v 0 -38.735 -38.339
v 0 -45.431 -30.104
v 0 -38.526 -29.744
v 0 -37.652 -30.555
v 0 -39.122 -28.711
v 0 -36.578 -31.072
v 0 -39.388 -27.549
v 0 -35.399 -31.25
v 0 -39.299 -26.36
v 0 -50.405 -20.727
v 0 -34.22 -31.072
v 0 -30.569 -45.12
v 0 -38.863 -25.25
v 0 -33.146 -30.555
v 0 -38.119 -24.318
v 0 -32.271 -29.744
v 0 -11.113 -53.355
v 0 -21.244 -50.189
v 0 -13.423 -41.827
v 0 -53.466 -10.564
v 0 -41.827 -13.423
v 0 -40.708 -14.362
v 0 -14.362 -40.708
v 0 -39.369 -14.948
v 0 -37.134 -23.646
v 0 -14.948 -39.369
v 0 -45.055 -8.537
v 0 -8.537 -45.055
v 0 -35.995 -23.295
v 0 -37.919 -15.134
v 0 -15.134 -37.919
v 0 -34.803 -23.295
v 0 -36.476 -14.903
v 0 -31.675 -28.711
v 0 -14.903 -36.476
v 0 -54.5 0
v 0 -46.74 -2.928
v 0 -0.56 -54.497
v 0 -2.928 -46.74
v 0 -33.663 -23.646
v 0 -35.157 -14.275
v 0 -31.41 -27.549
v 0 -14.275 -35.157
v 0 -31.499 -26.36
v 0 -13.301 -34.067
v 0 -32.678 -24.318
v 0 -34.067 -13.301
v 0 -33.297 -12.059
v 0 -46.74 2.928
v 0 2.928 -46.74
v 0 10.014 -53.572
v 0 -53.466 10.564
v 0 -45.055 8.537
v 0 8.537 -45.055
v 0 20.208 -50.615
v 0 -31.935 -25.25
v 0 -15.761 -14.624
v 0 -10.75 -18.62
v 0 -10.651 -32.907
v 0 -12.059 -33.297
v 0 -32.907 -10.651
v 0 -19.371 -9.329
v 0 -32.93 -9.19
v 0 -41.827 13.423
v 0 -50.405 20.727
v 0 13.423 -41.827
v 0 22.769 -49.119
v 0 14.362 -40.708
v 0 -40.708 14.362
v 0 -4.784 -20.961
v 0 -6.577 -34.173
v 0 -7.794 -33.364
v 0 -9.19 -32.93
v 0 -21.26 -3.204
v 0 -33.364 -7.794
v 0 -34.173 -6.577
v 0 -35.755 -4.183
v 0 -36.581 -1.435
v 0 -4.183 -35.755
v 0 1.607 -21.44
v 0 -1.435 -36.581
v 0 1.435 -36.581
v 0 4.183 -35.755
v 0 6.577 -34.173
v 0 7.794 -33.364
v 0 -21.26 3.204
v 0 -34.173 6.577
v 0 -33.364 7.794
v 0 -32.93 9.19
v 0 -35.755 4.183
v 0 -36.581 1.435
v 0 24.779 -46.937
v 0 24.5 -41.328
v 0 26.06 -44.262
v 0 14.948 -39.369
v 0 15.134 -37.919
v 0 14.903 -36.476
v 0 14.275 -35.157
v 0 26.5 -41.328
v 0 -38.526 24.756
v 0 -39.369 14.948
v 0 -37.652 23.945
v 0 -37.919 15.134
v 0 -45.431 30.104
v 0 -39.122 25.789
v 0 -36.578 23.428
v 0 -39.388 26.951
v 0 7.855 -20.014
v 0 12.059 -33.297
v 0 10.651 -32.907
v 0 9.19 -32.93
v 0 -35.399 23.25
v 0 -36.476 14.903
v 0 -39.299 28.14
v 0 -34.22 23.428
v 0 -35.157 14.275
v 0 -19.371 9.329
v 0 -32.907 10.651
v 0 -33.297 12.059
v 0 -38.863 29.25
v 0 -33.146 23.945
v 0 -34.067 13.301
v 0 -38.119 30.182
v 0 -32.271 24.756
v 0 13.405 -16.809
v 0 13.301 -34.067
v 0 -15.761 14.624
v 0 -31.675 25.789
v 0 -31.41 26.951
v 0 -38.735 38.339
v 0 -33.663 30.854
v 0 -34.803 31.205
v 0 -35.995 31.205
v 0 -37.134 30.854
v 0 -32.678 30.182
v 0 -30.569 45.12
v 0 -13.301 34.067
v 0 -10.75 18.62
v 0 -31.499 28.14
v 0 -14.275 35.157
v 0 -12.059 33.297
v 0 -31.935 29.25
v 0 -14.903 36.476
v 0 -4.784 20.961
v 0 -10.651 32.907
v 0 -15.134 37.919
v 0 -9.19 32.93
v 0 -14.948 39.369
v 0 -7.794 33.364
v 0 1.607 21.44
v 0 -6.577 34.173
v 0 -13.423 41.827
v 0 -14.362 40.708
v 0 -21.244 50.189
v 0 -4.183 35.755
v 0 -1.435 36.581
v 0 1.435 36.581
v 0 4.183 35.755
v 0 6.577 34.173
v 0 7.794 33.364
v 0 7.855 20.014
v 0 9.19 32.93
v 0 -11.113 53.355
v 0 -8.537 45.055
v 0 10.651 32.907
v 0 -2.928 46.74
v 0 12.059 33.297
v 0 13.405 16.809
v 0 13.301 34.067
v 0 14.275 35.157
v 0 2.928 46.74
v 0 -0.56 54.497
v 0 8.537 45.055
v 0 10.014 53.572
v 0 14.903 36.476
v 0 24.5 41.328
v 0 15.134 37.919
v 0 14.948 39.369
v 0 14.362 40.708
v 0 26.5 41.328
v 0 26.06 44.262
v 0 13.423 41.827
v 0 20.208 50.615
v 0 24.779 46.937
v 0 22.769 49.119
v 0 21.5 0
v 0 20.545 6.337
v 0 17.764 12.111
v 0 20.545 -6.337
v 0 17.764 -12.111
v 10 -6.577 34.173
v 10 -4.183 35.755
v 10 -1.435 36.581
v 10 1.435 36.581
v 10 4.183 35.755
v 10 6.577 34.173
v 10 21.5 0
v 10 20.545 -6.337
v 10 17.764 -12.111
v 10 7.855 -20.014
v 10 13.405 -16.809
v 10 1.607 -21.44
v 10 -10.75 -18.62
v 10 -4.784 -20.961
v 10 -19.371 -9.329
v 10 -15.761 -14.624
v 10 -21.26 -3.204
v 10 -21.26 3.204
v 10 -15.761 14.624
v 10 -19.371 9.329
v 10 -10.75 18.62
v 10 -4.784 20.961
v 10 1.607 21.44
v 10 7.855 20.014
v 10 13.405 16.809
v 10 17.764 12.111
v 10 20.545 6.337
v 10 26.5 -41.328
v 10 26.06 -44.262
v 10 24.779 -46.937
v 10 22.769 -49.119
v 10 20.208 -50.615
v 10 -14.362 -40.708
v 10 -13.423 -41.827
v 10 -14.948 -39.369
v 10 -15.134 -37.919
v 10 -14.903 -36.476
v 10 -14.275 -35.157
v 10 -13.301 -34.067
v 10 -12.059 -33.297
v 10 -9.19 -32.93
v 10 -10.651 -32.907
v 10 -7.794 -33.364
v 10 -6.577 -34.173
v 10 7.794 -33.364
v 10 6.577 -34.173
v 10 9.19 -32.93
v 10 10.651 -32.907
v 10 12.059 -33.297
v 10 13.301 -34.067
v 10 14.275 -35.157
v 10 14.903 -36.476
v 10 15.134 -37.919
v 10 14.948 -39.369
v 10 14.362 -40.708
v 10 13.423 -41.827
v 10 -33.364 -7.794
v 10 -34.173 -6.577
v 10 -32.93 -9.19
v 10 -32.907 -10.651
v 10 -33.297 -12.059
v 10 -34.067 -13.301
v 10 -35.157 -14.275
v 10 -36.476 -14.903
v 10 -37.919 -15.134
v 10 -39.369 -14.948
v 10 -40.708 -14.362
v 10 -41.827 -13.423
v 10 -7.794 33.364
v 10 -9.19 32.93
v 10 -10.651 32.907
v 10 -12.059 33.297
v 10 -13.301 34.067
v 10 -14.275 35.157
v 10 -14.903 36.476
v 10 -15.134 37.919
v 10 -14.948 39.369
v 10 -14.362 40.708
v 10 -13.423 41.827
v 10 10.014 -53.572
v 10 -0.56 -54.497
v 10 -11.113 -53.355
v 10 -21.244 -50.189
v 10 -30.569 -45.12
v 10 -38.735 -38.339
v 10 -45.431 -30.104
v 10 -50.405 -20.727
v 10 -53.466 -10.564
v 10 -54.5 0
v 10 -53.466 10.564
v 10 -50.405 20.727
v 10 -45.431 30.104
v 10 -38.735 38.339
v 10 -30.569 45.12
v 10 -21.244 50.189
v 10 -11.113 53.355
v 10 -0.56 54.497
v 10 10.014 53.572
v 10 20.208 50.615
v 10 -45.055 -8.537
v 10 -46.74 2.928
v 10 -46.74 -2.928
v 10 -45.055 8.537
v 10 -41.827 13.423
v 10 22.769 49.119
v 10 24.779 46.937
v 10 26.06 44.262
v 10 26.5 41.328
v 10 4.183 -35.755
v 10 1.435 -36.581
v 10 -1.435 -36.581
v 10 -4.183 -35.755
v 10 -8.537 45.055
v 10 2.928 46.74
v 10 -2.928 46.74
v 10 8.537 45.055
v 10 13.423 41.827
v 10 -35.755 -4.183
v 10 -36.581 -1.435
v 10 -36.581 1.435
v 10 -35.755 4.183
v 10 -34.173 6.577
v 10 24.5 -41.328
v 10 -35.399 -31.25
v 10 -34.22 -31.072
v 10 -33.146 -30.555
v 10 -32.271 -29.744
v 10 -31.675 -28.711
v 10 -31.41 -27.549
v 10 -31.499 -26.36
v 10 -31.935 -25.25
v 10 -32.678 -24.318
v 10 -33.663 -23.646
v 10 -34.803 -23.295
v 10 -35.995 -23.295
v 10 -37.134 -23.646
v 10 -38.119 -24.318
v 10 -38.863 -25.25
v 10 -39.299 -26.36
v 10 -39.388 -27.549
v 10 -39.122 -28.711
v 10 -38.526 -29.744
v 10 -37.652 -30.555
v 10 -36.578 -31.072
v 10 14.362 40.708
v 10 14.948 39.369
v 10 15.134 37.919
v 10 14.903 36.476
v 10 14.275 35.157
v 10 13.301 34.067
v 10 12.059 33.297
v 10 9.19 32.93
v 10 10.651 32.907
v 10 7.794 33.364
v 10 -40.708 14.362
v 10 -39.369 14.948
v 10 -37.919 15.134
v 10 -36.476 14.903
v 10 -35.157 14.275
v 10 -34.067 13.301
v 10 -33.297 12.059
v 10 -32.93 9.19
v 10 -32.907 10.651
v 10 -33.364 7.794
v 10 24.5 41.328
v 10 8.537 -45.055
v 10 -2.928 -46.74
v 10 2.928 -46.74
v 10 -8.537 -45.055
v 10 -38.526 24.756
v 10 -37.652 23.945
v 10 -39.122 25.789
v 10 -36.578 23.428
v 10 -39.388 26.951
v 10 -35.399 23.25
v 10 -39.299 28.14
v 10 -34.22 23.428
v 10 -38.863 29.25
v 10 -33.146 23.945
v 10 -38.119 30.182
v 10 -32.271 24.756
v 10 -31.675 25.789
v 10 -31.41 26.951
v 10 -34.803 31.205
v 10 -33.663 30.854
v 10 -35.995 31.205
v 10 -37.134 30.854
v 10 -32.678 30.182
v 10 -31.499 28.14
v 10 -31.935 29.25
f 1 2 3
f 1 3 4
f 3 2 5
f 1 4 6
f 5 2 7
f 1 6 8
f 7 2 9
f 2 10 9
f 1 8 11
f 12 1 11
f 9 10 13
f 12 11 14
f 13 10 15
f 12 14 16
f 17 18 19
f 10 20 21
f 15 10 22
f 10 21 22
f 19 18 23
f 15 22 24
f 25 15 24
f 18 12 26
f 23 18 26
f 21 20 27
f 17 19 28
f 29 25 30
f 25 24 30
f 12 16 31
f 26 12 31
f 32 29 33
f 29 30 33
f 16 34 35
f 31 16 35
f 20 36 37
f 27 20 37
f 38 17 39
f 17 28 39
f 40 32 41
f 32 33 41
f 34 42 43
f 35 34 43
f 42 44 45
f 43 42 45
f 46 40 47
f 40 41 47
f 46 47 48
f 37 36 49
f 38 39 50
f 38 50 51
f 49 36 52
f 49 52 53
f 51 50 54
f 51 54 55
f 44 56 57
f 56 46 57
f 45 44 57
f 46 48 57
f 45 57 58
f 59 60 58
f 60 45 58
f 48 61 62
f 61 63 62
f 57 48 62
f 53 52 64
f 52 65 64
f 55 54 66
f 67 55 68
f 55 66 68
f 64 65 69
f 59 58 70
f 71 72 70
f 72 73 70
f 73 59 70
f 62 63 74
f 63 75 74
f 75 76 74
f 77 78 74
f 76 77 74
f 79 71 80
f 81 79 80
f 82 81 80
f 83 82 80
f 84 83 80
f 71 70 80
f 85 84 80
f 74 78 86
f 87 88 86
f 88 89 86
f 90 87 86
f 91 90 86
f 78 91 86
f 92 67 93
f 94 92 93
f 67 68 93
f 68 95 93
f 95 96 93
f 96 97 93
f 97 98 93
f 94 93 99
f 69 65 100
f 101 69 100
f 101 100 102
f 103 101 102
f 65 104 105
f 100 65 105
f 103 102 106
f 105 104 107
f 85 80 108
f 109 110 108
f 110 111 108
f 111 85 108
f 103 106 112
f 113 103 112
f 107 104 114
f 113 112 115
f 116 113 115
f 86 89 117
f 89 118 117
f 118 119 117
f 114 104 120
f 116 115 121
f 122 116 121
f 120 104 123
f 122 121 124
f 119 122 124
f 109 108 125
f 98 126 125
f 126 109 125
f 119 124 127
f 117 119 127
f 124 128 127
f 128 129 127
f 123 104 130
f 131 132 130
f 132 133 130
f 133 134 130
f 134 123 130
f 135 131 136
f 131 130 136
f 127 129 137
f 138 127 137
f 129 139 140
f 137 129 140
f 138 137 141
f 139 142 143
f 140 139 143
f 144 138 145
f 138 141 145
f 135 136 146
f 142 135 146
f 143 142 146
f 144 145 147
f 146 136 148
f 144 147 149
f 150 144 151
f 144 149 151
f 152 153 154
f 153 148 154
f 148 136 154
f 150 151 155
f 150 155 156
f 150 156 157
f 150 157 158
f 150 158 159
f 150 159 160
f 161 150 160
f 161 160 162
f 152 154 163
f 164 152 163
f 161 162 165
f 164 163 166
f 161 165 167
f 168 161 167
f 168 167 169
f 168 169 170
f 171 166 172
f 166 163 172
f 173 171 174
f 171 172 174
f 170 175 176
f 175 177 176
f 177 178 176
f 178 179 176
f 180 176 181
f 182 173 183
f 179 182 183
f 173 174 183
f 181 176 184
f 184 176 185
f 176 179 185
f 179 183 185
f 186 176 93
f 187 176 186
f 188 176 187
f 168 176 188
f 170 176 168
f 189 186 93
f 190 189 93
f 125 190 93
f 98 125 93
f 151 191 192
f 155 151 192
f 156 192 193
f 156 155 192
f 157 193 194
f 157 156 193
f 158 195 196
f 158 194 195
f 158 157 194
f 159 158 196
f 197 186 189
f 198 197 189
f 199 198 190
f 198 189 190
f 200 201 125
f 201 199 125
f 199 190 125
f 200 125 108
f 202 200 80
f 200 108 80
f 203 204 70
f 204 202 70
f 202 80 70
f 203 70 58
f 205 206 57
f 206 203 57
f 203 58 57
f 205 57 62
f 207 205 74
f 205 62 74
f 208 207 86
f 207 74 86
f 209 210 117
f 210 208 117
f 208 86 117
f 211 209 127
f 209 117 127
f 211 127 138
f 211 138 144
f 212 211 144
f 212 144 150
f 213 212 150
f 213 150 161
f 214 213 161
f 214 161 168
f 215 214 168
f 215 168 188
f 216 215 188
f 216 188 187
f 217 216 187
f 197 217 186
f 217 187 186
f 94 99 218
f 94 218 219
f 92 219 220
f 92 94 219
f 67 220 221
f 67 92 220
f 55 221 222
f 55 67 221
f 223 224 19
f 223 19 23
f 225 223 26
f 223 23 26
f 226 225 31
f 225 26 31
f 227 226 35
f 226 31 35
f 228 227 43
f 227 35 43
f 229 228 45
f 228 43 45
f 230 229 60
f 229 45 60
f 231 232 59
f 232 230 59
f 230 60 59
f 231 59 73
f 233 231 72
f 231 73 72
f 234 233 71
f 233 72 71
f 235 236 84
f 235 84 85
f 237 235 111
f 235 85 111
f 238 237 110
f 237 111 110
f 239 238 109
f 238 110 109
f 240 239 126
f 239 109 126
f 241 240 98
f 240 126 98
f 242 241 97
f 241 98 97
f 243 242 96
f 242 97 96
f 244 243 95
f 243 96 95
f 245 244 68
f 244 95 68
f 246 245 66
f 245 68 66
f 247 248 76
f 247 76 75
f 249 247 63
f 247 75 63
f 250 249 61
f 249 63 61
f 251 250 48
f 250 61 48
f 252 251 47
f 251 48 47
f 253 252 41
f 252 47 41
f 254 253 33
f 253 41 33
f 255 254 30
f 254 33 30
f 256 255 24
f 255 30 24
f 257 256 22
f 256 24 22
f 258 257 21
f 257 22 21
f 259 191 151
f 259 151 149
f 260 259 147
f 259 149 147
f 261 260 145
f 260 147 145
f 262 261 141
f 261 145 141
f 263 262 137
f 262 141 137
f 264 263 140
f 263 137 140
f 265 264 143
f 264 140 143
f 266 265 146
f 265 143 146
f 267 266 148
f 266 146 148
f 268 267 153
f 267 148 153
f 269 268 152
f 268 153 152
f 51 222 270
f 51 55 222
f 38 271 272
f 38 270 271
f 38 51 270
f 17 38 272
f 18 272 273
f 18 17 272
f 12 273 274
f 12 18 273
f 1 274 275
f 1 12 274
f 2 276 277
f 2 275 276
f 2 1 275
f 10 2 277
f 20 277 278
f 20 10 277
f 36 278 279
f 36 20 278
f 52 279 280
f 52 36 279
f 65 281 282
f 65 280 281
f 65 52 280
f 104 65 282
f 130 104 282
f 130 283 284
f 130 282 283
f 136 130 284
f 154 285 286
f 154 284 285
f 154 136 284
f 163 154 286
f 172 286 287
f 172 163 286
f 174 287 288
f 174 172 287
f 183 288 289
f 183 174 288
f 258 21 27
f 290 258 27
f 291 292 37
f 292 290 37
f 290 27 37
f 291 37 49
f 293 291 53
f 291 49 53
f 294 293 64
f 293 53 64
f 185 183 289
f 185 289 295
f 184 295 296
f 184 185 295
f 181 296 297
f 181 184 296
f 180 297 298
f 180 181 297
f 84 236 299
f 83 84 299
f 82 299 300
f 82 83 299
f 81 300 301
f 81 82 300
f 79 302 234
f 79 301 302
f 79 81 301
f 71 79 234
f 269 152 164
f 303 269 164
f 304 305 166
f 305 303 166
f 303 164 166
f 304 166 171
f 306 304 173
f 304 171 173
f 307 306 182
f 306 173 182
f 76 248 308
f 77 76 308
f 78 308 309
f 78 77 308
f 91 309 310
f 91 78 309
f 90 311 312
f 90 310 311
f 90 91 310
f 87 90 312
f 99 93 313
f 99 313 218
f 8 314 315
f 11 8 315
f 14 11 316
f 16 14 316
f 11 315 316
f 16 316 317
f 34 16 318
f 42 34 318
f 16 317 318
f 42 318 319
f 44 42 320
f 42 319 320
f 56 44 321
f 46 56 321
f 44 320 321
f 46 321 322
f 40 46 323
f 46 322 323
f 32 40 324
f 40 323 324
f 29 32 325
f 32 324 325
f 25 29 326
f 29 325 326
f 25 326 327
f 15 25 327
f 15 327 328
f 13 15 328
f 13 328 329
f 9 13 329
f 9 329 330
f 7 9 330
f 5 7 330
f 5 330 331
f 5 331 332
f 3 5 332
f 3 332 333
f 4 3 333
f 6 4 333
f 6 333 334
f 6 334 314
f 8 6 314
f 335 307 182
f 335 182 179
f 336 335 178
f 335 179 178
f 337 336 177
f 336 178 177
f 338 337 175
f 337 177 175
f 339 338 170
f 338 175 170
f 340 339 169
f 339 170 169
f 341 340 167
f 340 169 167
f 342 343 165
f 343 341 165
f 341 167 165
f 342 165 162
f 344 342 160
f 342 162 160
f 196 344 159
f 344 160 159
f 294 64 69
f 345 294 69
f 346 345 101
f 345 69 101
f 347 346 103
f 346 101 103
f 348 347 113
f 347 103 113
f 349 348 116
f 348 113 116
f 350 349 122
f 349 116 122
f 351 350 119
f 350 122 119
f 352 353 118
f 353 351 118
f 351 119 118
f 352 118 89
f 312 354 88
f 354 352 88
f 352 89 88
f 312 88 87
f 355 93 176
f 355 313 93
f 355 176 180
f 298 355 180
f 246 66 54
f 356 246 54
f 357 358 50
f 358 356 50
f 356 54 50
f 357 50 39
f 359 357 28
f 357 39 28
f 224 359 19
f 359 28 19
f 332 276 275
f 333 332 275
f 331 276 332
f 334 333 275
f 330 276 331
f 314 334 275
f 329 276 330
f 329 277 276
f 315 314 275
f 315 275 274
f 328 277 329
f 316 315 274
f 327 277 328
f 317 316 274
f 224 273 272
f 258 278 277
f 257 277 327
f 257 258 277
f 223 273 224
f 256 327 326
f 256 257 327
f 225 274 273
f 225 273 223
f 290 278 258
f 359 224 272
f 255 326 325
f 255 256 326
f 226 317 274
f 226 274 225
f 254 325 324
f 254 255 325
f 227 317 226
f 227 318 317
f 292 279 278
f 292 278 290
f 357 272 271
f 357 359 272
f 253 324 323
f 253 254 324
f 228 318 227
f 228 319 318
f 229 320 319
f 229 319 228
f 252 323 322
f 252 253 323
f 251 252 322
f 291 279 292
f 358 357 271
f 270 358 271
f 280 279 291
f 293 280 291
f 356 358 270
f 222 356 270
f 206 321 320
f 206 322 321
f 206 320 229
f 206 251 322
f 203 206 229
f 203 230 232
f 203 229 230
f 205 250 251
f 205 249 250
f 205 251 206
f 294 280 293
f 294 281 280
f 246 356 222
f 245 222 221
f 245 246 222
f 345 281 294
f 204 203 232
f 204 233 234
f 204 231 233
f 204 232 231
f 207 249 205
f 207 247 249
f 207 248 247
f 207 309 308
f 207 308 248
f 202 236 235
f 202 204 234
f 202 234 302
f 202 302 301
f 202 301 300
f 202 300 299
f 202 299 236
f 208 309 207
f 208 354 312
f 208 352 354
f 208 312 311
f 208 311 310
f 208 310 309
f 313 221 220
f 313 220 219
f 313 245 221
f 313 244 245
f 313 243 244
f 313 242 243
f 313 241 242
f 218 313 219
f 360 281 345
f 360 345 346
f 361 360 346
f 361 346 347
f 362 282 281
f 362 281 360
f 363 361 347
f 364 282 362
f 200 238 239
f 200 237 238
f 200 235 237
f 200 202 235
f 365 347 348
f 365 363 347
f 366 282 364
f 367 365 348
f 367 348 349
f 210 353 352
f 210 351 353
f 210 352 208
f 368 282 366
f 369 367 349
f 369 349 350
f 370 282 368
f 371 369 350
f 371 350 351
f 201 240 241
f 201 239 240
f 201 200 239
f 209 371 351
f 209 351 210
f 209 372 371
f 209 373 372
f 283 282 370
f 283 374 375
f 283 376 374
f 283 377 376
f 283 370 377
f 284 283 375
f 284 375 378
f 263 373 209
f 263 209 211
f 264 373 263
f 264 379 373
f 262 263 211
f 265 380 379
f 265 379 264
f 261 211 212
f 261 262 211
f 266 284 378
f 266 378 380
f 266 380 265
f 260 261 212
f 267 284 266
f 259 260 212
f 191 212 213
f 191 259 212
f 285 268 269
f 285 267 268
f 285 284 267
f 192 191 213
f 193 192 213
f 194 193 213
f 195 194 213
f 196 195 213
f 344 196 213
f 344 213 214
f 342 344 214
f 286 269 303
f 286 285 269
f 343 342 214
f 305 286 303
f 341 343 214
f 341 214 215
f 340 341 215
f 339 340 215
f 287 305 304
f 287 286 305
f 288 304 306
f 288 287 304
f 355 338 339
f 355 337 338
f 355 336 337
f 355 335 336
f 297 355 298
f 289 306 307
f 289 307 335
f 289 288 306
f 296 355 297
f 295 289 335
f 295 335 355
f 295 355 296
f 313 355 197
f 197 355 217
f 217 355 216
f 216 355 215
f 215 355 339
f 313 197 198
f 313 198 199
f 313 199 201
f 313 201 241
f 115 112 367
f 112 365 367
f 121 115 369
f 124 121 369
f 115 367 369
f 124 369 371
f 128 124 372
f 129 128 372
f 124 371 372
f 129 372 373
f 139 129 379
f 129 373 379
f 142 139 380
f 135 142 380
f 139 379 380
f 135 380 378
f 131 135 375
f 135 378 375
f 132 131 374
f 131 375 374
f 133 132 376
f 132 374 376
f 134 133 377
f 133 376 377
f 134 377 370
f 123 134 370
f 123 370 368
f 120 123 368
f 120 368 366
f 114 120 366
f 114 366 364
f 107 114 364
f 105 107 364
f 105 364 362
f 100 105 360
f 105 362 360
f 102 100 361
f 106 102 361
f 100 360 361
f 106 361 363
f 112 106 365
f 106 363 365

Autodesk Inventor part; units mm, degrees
ref_plane "YZ Plane" through (0, 0, 0) normal (1, 0, 0) x (0, 1, 0)
ref_plane "XZ Plane" through (0, 0, 0) normal (0, 1, 0) x (-1, 0, 0)
ref_plane "XY Plane" through (0, 0, 0) normal (0, 0, 1) x (1, 0, 0)
sketch "Sketch1" plane through (0, 0, 0) normal (1, 0, 0) x (0, 1, 0)
  arc A0 (13.4228, -41.8269) -> (6.5772, -34.1731) centre (10, -38) ccw
  arc A1 (-13.4228, -41.8269) -> (13.4228, -41.8269) centre (0, -26.8197) ccw
  arc A2 (-6.5772, -34.1731) -> (-13.4228, -41.8269) centre (-10, -38) ccw
  arc A3 (-6.5772, -34.1731) -> (6.5772, -34.1731) centre (0, -26.8197) ccw
  arc A4 (-41.8269, -13.4228) -> (-34.1731, -6.5772) centre (-38, -10) ccw
  arc A5 (-41.8269, 13.4228) -> (-41.8269, -13.4228) centre (-26.8197, 0) ccw
  arc A6 (-34.1731, 6.5772) -> (-41.8269, 13.4228) centre (-38, 10) ccw
  arc A7 (-34.1731, 6.5772) -> (-34.1731, -6.5772) centre (-26.8197, 0) ccw
  arc A8 (-13.4228, 41.8269) -> (-6.5772, 34.1731) centre (-10, 38) ccw
  arc A9 (13.4228, 41.8269) -> (-13.4228, 41.8269) centre (0, 26.8197) ccw
  arc A10 (6.5772, 34.1731) -> (13.4228, 41.8269) centre (10, 38) ccw
  arc A11 (6.5772, 34.1731) -> (-6.5772, 34.1731) centre (0, 26.8197) ccw
  circle A12 centre (0, 0) radius 21.5
  circle A13 centre (-35.3988, 27.25) radius 3.5
  circle A14 centre (-35.3988, -27.25) radius 3.5
  arc A15 (20.2079, 50.6151) -> (20.2079, -50.6151) centre (0, 0) ccw
  line L0 (26.5, -41.328) -> (26.5, 41.328)
  arc A16 (26.5, 41.328) -> (20.2079, 50.6151) centre (16.5, 41.328) ccw
  arc A17 (20.2079, -50.6151) -> (26.5, -41.328) centre (16.5, -41.328) ccw
  point P0 (26.5, -47.6235)
  point P1 (26.5, 47.6235)
  dimension "d4" = 10
  dimension "d5" = 10
extrude "Extrusion1" add sketch "Sketch1" along normal blind 10
sketch "Sketch2" plane through (10, 0, 0) normal (1, 0, 0) x (0, 0, -1)
  line L0 (41.328, 26.5) -> (-41.328, 26.5) projected
  line L1 (0, 24.5) -> (41.328, 24.5)
  line L2 (41.328, 24.5) -> (41.328, 26.5)
  line L3 (0, 24.5) -> (-41.328, 24.5)
  line L4 (-41.328, 24.5) -> (-41.328, 26.5)
  point P0 (0, 0)
extrude "Extrusion2" cut sketch "Sketch2" against normal blind 10
sketch "Sketch3" plane through (10, 0, 0) normal (1, 0, 0) x (0, 0, -1)
  circle A0 centre (-27.25, -35.3988) radius 3.5 projected
  circle A1 centre (27.25, -35.3988) radius 3.5 projected
  circle A2 centre (-27.25, -35.3988) radius 4
  circle A3 centre (27.25, -35.3988) radius 4
  point P0 (0, 0)
  dimension "d11" = 8
  dimension "d12" = 8
extrude "Extrusion3" cut sketch "Sketch3" against normal blind 10
properties part number "ballast_tengah"
